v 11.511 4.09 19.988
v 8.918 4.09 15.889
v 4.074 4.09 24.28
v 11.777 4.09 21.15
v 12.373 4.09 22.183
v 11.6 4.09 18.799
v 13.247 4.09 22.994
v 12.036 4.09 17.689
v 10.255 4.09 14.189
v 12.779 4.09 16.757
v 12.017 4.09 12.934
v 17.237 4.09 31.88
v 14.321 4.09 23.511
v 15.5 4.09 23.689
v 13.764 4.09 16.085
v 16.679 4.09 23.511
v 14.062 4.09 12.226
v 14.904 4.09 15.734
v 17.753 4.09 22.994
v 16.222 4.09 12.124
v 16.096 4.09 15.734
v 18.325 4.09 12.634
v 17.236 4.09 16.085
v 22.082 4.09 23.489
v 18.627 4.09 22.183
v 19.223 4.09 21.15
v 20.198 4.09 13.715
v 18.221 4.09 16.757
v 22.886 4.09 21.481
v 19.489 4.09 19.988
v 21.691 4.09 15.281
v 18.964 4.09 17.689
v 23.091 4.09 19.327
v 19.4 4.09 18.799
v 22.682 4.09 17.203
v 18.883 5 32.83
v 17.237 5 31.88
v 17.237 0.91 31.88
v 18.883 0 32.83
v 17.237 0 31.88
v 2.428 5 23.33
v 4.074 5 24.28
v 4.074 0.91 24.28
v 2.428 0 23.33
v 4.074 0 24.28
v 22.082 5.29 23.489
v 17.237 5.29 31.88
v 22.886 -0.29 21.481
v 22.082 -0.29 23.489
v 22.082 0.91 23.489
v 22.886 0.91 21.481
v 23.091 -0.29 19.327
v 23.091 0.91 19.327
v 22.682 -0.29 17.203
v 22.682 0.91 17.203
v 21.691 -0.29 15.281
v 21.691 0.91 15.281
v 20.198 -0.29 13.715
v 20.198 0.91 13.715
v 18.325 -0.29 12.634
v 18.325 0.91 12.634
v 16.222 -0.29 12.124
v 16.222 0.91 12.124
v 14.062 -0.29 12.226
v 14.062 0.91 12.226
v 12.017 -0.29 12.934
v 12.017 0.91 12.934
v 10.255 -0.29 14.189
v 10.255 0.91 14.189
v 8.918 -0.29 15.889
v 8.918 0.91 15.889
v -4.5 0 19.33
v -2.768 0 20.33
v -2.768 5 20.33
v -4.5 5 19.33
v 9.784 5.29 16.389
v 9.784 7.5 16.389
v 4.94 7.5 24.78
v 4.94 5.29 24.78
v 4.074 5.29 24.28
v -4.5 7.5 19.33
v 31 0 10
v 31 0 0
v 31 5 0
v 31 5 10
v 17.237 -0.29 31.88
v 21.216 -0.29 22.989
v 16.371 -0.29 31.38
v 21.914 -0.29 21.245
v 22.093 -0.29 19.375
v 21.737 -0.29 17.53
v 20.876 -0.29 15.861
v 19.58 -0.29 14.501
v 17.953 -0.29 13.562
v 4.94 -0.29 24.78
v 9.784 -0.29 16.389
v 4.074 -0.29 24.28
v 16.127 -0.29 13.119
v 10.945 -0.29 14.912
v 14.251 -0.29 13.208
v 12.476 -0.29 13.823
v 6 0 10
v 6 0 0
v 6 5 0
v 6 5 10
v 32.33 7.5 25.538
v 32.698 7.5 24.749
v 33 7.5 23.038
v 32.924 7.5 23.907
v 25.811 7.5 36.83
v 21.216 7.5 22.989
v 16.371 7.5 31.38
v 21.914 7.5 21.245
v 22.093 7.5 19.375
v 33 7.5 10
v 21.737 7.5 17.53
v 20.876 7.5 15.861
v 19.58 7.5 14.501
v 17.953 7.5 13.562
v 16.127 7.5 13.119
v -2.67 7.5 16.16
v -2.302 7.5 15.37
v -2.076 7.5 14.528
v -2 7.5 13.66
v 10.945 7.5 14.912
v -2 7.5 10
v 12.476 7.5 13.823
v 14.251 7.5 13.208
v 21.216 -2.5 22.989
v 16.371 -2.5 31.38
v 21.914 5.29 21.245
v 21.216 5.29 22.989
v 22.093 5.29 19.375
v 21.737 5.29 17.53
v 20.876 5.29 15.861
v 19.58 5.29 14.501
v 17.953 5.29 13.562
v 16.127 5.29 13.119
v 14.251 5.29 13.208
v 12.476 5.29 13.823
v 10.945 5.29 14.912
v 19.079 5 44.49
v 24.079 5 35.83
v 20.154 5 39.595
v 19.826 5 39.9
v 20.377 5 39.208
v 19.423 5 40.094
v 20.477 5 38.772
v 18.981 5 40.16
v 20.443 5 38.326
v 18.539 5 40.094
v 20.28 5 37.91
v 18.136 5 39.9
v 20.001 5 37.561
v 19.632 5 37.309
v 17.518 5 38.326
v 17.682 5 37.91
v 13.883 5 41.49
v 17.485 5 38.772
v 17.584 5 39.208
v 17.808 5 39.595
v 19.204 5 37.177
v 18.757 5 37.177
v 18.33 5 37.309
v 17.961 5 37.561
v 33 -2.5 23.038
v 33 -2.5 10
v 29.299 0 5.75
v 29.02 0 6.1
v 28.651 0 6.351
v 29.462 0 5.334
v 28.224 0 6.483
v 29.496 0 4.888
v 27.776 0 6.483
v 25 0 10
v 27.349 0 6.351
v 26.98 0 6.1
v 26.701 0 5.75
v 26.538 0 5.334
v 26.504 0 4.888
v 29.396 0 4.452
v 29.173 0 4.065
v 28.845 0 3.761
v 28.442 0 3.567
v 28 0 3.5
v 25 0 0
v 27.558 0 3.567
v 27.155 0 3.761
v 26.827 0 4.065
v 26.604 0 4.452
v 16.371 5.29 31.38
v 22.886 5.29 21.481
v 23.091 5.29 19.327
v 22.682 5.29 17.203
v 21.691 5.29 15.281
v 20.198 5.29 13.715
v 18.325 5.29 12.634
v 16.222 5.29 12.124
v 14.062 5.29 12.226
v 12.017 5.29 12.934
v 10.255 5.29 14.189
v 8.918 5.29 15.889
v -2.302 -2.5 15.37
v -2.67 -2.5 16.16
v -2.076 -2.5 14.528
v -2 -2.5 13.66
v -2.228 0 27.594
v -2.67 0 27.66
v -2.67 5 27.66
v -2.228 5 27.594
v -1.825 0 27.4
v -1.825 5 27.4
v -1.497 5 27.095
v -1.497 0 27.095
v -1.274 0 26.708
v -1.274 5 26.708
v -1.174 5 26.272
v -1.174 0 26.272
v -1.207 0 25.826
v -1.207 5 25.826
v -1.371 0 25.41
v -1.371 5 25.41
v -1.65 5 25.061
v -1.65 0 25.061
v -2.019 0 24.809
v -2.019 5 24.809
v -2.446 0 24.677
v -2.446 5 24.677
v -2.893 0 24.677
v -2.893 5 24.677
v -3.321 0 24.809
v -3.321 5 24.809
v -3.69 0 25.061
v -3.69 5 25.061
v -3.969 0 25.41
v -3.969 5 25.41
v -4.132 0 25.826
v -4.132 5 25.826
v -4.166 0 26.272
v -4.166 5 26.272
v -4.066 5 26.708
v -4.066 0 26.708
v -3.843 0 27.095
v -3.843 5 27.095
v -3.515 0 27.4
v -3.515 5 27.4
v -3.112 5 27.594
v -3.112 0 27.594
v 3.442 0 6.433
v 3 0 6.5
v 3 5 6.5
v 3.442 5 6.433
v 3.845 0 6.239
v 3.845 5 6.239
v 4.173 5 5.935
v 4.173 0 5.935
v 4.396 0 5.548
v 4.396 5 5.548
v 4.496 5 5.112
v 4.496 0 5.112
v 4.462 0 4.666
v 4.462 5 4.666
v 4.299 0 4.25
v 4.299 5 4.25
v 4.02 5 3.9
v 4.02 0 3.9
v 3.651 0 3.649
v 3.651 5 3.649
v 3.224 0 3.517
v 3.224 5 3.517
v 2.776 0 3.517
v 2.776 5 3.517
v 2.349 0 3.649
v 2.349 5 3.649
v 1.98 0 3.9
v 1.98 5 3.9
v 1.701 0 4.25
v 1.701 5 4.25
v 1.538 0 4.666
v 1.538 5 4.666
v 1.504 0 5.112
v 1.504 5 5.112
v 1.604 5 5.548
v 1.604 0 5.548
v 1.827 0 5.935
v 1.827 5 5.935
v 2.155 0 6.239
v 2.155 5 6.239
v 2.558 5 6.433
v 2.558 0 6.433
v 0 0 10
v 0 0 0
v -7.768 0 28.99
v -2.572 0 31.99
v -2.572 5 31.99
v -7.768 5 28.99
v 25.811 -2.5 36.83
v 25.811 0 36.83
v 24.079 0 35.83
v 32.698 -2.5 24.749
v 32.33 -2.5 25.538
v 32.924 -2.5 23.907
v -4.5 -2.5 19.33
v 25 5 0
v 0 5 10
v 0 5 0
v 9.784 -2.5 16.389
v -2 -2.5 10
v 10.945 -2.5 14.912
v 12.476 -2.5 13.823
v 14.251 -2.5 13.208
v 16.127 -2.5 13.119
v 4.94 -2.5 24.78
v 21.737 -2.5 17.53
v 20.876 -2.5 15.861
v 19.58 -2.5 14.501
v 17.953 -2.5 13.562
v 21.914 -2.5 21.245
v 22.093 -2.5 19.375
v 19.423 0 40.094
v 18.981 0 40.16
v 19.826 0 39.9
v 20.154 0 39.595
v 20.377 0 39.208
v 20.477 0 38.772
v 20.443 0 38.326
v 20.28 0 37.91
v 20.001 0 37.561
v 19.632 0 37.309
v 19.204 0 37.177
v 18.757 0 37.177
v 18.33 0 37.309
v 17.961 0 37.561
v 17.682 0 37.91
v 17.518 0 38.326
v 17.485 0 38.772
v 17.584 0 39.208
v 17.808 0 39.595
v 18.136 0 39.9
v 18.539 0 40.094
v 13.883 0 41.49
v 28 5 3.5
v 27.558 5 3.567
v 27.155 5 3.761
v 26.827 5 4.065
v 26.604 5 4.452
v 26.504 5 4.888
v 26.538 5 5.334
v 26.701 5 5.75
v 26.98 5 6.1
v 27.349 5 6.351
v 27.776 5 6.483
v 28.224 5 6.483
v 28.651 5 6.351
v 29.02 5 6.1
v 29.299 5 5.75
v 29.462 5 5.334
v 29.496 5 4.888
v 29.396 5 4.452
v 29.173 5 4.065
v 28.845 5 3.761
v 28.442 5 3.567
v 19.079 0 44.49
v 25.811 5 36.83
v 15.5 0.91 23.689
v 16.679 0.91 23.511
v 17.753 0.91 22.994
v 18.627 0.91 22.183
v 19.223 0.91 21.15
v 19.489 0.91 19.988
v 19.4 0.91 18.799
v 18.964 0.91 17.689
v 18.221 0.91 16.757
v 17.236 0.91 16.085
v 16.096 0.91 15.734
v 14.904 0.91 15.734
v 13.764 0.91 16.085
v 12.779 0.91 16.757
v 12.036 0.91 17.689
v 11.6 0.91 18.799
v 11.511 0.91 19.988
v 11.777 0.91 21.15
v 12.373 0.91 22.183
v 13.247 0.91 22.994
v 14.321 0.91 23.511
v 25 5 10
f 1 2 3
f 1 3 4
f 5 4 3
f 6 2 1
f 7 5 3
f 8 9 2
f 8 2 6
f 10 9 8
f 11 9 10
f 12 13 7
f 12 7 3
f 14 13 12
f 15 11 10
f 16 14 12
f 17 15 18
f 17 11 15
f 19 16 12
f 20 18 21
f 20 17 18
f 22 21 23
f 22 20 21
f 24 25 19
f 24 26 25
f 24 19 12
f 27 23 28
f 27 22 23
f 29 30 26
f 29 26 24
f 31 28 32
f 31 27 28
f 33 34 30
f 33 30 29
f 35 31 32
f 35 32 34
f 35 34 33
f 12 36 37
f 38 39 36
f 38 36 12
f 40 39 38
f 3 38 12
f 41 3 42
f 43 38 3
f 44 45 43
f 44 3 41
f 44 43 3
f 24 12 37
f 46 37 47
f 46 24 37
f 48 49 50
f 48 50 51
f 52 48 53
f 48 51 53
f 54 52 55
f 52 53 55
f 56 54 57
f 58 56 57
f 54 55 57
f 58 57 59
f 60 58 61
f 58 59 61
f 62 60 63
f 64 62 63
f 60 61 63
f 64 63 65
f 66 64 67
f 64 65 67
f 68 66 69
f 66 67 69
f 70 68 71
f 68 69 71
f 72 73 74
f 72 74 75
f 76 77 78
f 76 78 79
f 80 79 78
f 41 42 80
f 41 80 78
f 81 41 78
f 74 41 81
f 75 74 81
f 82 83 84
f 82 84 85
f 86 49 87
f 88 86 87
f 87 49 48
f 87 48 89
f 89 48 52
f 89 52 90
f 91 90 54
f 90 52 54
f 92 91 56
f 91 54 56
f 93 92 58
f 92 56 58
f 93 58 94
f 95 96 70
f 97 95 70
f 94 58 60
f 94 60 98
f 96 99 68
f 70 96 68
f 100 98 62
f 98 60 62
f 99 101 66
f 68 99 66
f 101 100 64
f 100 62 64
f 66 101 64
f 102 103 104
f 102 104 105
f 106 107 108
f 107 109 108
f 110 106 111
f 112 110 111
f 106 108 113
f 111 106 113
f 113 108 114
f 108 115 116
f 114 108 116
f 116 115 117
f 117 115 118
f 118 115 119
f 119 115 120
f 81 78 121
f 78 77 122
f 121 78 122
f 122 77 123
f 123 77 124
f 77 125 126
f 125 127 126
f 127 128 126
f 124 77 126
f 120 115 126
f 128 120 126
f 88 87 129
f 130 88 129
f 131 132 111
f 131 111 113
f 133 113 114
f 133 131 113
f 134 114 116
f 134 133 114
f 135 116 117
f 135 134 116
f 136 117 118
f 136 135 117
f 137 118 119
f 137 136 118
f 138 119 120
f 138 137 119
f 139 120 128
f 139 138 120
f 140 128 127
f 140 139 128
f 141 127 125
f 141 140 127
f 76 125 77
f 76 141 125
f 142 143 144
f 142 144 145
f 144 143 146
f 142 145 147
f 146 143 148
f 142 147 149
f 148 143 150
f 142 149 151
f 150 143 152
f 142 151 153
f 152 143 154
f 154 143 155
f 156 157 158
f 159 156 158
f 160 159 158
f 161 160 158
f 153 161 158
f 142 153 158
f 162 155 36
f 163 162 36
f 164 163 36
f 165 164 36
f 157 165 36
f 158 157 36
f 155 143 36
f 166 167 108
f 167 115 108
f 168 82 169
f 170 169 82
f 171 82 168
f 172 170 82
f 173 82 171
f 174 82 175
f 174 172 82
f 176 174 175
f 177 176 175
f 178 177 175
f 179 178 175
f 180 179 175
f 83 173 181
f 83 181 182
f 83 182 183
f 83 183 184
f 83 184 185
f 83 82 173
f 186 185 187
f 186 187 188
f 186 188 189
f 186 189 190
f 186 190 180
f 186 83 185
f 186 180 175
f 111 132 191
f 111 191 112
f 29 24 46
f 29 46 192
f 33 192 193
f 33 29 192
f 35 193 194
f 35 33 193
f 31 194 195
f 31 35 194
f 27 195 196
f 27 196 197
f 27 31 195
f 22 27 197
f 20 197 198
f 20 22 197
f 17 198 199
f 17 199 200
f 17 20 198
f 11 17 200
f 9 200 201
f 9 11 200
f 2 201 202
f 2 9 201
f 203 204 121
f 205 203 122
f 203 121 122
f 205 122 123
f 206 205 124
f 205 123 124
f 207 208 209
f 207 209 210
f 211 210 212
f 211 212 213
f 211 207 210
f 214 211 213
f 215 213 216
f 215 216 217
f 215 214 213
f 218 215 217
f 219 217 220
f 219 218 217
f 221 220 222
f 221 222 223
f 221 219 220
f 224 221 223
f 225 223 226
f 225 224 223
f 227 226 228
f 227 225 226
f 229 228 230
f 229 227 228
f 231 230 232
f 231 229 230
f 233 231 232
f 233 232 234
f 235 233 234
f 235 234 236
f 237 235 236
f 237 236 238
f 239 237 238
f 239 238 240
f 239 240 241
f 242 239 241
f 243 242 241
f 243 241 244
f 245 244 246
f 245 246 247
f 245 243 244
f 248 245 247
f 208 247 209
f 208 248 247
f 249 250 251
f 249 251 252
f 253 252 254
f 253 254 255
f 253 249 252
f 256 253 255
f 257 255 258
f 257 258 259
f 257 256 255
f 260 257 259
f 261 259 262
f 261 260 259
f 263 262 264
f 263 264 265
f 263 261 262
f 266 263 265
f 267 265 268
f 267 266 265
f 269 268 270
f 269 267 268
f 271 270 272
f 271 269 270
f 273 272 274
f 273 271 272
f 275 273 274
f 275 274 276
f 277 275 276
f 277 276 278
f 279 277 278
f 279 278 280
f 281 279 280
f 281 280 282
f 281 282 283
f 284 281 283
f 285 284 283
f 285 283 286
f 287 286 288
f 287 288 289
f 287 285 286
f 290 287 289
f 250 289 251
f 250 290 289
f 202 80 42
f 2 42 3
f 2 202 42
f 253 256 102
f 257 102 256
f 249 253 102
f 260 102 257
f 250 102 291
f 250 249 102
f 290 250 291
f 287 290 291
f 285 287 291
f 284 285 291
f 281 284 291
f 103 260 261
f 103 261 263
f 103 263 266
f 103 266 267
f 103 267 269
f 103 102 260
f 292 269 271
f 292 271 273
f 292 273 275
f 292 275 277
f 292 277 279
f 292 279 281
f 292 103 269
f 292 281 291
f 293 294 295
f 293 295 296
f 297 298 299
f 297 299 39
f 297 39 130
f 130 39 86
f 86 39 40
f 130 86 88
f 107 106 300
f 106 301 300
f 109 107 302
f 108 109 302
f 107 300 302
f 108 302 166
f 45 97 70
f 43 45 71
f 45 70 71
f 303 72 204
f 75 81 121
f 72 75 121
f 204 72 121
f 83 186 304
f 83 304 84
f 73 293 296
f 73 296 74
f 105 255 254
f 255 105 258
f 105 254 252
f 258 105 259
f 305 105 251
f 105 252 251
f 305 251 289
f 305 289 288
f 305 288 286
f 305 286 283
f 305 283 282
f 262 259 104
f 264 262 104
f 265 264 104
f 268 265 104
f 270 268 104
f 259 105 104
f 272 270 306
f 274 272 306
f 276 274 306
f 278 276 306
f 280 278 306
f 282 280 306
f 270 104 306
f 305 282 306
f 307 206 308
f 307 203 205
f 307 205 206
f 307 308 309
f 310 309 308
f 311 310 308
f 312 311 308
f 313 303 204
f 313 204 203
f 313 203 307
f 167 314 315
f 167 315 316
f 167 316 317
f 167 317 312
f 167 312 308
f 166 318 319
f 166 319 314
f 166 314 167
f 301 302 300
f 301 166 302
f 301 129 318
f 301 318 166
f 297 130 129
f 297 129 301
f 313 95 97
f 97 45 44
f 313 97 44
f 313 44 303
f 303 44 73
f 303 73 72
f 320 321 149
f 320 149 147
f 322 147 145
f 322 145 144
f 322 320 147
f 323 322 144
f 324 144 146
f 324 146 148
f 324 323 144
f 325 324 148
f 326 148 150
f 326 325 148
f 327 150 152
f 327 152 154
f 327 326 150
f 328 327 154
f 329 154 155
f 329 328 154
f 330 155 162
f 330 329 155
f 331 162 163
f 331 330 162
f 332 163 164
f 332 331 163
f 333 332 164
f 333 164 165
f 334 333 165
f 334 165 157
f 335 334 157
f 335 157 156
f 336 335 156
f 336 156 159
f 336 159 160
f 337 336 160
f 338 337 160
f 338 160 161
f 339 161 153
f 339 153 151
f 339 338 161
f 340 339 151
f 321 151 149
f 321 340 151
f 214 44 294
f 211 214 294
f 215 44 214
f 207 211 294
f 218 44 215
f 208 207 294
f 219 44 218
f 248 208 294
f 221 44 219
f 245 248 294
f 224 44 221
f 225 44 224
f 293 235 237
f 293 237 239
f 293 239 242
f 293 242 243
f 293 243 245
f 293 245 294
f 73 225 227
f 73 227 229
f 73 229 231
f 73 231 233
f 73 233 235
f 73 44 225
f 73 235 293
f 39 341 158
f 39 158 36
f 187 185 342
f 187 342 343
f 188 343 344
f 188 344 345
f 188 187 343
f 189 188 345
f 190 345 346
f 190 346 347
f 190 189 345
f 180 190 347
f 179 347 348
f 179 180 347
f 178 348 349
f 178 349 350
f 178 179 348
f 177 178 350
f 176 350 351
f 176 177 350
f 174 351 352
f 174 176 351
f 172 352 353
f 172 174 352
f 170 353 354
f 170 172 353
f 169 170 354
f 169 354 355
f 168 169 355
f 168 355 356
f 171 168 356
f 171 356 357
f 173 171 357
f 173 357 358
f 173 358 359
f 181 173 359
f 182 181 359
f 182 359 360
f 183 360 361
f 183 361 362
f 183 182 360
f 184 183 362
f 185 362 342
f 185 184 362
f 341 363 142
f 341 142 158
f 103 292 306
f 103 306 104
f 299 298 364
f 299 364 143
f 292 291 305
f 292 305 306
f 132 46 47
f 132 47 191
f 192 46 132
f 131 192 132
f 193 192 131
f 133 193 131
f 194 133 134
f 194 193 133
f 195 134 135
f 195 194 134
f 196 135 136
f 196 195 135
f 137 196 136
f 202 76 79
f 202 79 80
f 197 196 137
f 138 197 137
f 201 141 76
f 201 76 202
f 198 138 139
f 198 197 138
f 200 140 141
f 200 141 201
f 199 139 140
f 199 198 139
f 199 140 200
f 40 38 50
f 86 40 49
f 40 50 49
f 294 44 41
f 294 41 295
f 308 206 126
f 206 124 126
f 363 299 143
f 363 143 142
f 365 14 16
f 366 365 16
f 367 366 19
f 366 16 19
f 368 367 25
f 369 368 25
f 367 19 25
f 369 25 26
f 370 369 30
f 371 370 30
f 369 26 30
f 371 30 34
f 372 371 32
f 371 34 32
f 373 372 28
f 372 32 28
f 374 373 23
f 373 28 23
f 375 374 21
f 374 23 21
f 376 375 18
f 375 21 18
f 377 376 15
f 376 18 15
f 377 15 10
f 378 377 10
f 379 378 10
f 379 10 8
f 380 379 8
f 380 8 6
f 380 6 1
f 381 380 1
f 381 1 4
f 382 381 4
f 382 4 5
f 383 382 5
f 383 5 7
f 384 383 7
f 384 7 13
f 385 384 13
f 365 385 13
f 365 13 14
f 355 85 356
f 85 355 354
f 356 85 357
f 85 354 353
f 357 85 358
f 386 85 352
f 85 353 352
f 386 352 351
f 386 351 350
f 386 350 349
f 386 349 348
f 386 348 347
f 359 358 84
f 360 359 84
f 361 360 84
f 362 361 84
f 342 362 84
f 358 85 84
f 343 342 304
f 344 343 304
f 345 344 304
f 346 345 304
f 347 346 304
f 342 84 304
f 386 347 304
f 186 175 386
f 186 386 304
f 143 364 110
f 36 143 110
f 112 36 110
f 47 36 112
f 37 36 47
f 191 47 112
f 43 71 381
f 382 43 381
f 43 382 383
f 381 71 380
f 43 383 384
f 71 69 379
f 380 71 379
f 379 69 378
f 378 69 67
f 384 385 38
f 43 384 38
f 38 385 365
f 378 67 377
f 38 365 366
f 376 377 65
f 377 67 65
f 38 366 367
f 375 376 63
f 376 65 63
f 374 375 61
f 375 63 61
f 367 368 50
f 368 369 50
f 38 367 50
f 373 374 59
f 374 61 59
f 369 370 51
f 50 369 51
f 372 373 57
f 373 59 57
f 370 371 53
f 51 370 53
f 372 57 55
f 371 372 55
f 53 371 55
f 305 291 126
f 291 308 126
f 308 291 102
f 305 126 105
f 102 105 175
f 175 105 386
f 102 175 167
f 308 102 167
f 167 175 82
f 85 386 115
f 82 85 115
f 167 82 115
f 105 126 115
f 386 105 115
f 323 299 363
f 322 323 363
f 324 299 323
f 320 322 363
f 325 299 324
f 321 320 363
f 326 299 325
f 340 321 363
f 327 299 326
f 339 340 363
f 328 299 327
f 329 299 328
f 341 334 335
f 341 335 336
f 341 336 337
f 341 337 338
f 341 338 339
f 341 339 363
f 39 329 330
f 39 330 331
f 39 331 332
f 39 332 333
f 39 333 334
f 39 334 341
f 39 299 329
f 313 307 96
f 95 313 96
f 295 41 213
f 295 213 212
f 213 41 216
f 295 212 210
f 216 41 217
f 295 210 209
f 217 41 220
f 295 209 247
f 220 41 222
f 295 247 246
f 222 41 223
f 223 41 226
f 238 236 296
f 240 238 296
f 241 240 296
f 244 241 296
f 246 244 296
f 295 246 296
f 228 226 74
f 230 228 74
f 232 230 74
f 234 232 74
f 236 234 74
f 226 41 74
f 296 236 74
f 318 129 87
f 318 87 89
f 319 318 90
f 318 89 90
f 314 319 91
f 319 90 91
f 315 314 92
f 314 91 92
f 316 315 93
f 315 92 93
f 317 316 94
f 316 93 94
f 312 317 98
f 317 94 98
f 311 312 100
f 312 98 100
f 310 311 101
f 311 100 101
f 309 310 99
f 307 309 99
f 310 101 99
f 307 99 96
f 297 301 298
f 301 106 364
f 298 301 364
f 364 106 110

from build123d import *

# Parameters (mm, degrees)
SKETCH1_R           = 1.5
BOSS_EXTRUDE1_DEPTH = 5
BOSS_EXTRUDE2_DEPTH = 2.5
BOSS_EXTRUDE3_DEPTH = 2.5
SKETCH6_R           = 7.6
CUT_EXTRUDE1_DEPTH  = 1.2
SKETCH8_R           = 6.6
CUT_EXTRUDE2_DEPTH  = 56.938163239
CUT_EXTRUDE5_START  = -9.689111
CUT_EXTRUDE5_DEPTH  = 9.689111
FILLET1_R           = 5
SKETCH9_R           = 4
CUT_EXTRUDE6_DEPTH  = 56.783708254


with BuildPart() as part:
    # Sketch1 → Boss-Extrude1 (new body)
    with BuildSketch(Plane(origin=(0, 0, 0), x_dir=(1, 0, 0), z_dir=(0, 1, 0))):
        Polygon((0, 0), (6, 0), (6, -10), (25, -10), (25, 0), (31, 0), (31, -10), (33, -10), (33, -24.378221735), (25.810889132, -36.830127019), (24.078838325, -35.830127019), (19.078838325, -44.490381057), (13.882685902, -41.490381057), (18.882685902, -32.830127019), (2.42820323, -23.330127019), (-2.57179677, -31.990381057), (-7.767949192, -28.990381057), (-2.767949192, -20.330127019), (-4.5, -19.330127019), (-2, -15), (-2, -10), (0, -10), align=None)
        with Locations(Location((3, -5, 0), (0, 0, 270))):
            Circle(SKETCH1_R, mode=Mode.SUBTRACT)
        with Locations(Location((28, -5, 0), (0, 0, 90))):
            Circle(SKETCH1_R, mode=Mode.SUBTRACT)
        with Locations(Location((-2.669872981, -26.160254038, 0), (0, 0, 270))):
            Circle(SKETCH1_R, mode=Mode.SUBTRACT)
        with Locations(Location((18.980762114, -38.660254038, 0), (0, 0, 270))):
            Circle(SKETCH1_R, mode=Mode.SUBTRACT)
    extrude(amount=BOSS_EXTRUDE1_DEPTH)

    # Sketch2 → Boss-Extrude2 (add)
    with BuildSketch(Plane(origin=(0, 5, 0), x_dir=(1, 0, 0), z_dir=(0, 1, 0))):
        Polygon((-2, -10), (33, -10), (33, -24.378221735), (25.810889132, -36.830127019), (-4.5, -19.330127019), (-2, -15), align=None)
    extrude(amount=BOSS_EXTRUDE2_DEPTH)

    # Sketch3 → Boss-Extrude3 (add)
    with BuildSketch(Plane.XZ):
        Polygon((-2, 10), (33, 10), (33, 24.378221735), (25.810889132, 36.830127019), (-4.5, 19.330127019), (-2, 15), align=None)
    extrude(amount=BOSS_EXTRUDE3_DEPTH)

    # Sketch6 → Cut-Extrude1 (cut)
    with BuildSketch(Plane(origin=(0, 4.09, 0), x_dir=(1, 0, 0), z_dir=(0, 1, 0))):
        with Locations(Location((15.5, -19.689110868, 0), (0, 0, 270))):
            Circle(SKETCH6_R)
    cut_extrude1 = extrude(amount=CUT_EXTRUDE1_DEPTH, mode=Mode.SUBTRACT)

    # Sketch8 → Cut-Extrude2 (cut, through all)
    with BuildSketch(Plane(origin=(0, 5.29, 0), x_dir=(1, 0, 0), z_dir=(0, 1, 0))):
        with Locations(Location((15.5, -19.689110868, 0), (0, 0, 270))):
            Circle(SKETCH8_R)
    cut_extrude2 = extrude(amount=CUT_EXTRUDE2_DEPTH, mode=Mode.SUBTRACT)

    # Sketch5 → Cut-Extrude5 (cut)
    with BuildSketch(Plane(origin=(-9.495190528, 0, 16.446152423), x_dir=(0.8660254037844386, 0, 0.5000000000000003), z_dir=(-0.5000000000000003, 0, 0.8660254037844386)).offset(CUT_EXTRUDE5_START)):
        Polygon((16.667949192, 7.5), (16.667949192, 5.29), (15.667949192, 5.29), (15.667949192, 4.09), (23.267949192, 4.09), (30.867949192, 4.09), (30.867949192, 5.29), (29.867949192, 5.29), (29.867949192, 7.5), align=None)
    cut_extrude5 = extrude(amount=CUT_EXTRUDE5_DEPTH, mode=Mode.SUBTRACT)

    # Mirror1: Cut-Extrude1, Cut-Extrude2, Cut-Extrude5 across plane
    add(cut_extrude1.mirror(Plane.ZX.offset(2.5)), mode=Mode.SUBTRACT)
    add(cut_extrude2.mirror(Plane.ZX.offset(2.5)), mode=Mode.SUBTRACT)
    add(cut_extrude5.mirror(Plane.ZX.offset(2.5)), mode=Mode.SUBTRACT)

    # Fillet1
    fillet1_edges = [part.edges().sort_by_distance(p)[0] for p in [
        (33, 2.5, 24.378221735),
        (-2, 2.5, 15),
    ]]
    fillet(fillet1_edges, radius=FILLET1_R)

    # Sketch9 → Cut-Extrude6 (cut, through all)
    with BuildSketch(Plane(origin=(0, 4.09, 0), x_dir=(1, 0, 0), z_dir=(0, 1, 0))):
        with Locations(Location((15.5, -19.689110868, 0), (0, 0, 270))):
            Circle(SKETCH9_R)
    extrude(amount=-CUT_EXTRUDE6_DEPTH, mode=Mode.SUBTRACT)


solid = part.part
